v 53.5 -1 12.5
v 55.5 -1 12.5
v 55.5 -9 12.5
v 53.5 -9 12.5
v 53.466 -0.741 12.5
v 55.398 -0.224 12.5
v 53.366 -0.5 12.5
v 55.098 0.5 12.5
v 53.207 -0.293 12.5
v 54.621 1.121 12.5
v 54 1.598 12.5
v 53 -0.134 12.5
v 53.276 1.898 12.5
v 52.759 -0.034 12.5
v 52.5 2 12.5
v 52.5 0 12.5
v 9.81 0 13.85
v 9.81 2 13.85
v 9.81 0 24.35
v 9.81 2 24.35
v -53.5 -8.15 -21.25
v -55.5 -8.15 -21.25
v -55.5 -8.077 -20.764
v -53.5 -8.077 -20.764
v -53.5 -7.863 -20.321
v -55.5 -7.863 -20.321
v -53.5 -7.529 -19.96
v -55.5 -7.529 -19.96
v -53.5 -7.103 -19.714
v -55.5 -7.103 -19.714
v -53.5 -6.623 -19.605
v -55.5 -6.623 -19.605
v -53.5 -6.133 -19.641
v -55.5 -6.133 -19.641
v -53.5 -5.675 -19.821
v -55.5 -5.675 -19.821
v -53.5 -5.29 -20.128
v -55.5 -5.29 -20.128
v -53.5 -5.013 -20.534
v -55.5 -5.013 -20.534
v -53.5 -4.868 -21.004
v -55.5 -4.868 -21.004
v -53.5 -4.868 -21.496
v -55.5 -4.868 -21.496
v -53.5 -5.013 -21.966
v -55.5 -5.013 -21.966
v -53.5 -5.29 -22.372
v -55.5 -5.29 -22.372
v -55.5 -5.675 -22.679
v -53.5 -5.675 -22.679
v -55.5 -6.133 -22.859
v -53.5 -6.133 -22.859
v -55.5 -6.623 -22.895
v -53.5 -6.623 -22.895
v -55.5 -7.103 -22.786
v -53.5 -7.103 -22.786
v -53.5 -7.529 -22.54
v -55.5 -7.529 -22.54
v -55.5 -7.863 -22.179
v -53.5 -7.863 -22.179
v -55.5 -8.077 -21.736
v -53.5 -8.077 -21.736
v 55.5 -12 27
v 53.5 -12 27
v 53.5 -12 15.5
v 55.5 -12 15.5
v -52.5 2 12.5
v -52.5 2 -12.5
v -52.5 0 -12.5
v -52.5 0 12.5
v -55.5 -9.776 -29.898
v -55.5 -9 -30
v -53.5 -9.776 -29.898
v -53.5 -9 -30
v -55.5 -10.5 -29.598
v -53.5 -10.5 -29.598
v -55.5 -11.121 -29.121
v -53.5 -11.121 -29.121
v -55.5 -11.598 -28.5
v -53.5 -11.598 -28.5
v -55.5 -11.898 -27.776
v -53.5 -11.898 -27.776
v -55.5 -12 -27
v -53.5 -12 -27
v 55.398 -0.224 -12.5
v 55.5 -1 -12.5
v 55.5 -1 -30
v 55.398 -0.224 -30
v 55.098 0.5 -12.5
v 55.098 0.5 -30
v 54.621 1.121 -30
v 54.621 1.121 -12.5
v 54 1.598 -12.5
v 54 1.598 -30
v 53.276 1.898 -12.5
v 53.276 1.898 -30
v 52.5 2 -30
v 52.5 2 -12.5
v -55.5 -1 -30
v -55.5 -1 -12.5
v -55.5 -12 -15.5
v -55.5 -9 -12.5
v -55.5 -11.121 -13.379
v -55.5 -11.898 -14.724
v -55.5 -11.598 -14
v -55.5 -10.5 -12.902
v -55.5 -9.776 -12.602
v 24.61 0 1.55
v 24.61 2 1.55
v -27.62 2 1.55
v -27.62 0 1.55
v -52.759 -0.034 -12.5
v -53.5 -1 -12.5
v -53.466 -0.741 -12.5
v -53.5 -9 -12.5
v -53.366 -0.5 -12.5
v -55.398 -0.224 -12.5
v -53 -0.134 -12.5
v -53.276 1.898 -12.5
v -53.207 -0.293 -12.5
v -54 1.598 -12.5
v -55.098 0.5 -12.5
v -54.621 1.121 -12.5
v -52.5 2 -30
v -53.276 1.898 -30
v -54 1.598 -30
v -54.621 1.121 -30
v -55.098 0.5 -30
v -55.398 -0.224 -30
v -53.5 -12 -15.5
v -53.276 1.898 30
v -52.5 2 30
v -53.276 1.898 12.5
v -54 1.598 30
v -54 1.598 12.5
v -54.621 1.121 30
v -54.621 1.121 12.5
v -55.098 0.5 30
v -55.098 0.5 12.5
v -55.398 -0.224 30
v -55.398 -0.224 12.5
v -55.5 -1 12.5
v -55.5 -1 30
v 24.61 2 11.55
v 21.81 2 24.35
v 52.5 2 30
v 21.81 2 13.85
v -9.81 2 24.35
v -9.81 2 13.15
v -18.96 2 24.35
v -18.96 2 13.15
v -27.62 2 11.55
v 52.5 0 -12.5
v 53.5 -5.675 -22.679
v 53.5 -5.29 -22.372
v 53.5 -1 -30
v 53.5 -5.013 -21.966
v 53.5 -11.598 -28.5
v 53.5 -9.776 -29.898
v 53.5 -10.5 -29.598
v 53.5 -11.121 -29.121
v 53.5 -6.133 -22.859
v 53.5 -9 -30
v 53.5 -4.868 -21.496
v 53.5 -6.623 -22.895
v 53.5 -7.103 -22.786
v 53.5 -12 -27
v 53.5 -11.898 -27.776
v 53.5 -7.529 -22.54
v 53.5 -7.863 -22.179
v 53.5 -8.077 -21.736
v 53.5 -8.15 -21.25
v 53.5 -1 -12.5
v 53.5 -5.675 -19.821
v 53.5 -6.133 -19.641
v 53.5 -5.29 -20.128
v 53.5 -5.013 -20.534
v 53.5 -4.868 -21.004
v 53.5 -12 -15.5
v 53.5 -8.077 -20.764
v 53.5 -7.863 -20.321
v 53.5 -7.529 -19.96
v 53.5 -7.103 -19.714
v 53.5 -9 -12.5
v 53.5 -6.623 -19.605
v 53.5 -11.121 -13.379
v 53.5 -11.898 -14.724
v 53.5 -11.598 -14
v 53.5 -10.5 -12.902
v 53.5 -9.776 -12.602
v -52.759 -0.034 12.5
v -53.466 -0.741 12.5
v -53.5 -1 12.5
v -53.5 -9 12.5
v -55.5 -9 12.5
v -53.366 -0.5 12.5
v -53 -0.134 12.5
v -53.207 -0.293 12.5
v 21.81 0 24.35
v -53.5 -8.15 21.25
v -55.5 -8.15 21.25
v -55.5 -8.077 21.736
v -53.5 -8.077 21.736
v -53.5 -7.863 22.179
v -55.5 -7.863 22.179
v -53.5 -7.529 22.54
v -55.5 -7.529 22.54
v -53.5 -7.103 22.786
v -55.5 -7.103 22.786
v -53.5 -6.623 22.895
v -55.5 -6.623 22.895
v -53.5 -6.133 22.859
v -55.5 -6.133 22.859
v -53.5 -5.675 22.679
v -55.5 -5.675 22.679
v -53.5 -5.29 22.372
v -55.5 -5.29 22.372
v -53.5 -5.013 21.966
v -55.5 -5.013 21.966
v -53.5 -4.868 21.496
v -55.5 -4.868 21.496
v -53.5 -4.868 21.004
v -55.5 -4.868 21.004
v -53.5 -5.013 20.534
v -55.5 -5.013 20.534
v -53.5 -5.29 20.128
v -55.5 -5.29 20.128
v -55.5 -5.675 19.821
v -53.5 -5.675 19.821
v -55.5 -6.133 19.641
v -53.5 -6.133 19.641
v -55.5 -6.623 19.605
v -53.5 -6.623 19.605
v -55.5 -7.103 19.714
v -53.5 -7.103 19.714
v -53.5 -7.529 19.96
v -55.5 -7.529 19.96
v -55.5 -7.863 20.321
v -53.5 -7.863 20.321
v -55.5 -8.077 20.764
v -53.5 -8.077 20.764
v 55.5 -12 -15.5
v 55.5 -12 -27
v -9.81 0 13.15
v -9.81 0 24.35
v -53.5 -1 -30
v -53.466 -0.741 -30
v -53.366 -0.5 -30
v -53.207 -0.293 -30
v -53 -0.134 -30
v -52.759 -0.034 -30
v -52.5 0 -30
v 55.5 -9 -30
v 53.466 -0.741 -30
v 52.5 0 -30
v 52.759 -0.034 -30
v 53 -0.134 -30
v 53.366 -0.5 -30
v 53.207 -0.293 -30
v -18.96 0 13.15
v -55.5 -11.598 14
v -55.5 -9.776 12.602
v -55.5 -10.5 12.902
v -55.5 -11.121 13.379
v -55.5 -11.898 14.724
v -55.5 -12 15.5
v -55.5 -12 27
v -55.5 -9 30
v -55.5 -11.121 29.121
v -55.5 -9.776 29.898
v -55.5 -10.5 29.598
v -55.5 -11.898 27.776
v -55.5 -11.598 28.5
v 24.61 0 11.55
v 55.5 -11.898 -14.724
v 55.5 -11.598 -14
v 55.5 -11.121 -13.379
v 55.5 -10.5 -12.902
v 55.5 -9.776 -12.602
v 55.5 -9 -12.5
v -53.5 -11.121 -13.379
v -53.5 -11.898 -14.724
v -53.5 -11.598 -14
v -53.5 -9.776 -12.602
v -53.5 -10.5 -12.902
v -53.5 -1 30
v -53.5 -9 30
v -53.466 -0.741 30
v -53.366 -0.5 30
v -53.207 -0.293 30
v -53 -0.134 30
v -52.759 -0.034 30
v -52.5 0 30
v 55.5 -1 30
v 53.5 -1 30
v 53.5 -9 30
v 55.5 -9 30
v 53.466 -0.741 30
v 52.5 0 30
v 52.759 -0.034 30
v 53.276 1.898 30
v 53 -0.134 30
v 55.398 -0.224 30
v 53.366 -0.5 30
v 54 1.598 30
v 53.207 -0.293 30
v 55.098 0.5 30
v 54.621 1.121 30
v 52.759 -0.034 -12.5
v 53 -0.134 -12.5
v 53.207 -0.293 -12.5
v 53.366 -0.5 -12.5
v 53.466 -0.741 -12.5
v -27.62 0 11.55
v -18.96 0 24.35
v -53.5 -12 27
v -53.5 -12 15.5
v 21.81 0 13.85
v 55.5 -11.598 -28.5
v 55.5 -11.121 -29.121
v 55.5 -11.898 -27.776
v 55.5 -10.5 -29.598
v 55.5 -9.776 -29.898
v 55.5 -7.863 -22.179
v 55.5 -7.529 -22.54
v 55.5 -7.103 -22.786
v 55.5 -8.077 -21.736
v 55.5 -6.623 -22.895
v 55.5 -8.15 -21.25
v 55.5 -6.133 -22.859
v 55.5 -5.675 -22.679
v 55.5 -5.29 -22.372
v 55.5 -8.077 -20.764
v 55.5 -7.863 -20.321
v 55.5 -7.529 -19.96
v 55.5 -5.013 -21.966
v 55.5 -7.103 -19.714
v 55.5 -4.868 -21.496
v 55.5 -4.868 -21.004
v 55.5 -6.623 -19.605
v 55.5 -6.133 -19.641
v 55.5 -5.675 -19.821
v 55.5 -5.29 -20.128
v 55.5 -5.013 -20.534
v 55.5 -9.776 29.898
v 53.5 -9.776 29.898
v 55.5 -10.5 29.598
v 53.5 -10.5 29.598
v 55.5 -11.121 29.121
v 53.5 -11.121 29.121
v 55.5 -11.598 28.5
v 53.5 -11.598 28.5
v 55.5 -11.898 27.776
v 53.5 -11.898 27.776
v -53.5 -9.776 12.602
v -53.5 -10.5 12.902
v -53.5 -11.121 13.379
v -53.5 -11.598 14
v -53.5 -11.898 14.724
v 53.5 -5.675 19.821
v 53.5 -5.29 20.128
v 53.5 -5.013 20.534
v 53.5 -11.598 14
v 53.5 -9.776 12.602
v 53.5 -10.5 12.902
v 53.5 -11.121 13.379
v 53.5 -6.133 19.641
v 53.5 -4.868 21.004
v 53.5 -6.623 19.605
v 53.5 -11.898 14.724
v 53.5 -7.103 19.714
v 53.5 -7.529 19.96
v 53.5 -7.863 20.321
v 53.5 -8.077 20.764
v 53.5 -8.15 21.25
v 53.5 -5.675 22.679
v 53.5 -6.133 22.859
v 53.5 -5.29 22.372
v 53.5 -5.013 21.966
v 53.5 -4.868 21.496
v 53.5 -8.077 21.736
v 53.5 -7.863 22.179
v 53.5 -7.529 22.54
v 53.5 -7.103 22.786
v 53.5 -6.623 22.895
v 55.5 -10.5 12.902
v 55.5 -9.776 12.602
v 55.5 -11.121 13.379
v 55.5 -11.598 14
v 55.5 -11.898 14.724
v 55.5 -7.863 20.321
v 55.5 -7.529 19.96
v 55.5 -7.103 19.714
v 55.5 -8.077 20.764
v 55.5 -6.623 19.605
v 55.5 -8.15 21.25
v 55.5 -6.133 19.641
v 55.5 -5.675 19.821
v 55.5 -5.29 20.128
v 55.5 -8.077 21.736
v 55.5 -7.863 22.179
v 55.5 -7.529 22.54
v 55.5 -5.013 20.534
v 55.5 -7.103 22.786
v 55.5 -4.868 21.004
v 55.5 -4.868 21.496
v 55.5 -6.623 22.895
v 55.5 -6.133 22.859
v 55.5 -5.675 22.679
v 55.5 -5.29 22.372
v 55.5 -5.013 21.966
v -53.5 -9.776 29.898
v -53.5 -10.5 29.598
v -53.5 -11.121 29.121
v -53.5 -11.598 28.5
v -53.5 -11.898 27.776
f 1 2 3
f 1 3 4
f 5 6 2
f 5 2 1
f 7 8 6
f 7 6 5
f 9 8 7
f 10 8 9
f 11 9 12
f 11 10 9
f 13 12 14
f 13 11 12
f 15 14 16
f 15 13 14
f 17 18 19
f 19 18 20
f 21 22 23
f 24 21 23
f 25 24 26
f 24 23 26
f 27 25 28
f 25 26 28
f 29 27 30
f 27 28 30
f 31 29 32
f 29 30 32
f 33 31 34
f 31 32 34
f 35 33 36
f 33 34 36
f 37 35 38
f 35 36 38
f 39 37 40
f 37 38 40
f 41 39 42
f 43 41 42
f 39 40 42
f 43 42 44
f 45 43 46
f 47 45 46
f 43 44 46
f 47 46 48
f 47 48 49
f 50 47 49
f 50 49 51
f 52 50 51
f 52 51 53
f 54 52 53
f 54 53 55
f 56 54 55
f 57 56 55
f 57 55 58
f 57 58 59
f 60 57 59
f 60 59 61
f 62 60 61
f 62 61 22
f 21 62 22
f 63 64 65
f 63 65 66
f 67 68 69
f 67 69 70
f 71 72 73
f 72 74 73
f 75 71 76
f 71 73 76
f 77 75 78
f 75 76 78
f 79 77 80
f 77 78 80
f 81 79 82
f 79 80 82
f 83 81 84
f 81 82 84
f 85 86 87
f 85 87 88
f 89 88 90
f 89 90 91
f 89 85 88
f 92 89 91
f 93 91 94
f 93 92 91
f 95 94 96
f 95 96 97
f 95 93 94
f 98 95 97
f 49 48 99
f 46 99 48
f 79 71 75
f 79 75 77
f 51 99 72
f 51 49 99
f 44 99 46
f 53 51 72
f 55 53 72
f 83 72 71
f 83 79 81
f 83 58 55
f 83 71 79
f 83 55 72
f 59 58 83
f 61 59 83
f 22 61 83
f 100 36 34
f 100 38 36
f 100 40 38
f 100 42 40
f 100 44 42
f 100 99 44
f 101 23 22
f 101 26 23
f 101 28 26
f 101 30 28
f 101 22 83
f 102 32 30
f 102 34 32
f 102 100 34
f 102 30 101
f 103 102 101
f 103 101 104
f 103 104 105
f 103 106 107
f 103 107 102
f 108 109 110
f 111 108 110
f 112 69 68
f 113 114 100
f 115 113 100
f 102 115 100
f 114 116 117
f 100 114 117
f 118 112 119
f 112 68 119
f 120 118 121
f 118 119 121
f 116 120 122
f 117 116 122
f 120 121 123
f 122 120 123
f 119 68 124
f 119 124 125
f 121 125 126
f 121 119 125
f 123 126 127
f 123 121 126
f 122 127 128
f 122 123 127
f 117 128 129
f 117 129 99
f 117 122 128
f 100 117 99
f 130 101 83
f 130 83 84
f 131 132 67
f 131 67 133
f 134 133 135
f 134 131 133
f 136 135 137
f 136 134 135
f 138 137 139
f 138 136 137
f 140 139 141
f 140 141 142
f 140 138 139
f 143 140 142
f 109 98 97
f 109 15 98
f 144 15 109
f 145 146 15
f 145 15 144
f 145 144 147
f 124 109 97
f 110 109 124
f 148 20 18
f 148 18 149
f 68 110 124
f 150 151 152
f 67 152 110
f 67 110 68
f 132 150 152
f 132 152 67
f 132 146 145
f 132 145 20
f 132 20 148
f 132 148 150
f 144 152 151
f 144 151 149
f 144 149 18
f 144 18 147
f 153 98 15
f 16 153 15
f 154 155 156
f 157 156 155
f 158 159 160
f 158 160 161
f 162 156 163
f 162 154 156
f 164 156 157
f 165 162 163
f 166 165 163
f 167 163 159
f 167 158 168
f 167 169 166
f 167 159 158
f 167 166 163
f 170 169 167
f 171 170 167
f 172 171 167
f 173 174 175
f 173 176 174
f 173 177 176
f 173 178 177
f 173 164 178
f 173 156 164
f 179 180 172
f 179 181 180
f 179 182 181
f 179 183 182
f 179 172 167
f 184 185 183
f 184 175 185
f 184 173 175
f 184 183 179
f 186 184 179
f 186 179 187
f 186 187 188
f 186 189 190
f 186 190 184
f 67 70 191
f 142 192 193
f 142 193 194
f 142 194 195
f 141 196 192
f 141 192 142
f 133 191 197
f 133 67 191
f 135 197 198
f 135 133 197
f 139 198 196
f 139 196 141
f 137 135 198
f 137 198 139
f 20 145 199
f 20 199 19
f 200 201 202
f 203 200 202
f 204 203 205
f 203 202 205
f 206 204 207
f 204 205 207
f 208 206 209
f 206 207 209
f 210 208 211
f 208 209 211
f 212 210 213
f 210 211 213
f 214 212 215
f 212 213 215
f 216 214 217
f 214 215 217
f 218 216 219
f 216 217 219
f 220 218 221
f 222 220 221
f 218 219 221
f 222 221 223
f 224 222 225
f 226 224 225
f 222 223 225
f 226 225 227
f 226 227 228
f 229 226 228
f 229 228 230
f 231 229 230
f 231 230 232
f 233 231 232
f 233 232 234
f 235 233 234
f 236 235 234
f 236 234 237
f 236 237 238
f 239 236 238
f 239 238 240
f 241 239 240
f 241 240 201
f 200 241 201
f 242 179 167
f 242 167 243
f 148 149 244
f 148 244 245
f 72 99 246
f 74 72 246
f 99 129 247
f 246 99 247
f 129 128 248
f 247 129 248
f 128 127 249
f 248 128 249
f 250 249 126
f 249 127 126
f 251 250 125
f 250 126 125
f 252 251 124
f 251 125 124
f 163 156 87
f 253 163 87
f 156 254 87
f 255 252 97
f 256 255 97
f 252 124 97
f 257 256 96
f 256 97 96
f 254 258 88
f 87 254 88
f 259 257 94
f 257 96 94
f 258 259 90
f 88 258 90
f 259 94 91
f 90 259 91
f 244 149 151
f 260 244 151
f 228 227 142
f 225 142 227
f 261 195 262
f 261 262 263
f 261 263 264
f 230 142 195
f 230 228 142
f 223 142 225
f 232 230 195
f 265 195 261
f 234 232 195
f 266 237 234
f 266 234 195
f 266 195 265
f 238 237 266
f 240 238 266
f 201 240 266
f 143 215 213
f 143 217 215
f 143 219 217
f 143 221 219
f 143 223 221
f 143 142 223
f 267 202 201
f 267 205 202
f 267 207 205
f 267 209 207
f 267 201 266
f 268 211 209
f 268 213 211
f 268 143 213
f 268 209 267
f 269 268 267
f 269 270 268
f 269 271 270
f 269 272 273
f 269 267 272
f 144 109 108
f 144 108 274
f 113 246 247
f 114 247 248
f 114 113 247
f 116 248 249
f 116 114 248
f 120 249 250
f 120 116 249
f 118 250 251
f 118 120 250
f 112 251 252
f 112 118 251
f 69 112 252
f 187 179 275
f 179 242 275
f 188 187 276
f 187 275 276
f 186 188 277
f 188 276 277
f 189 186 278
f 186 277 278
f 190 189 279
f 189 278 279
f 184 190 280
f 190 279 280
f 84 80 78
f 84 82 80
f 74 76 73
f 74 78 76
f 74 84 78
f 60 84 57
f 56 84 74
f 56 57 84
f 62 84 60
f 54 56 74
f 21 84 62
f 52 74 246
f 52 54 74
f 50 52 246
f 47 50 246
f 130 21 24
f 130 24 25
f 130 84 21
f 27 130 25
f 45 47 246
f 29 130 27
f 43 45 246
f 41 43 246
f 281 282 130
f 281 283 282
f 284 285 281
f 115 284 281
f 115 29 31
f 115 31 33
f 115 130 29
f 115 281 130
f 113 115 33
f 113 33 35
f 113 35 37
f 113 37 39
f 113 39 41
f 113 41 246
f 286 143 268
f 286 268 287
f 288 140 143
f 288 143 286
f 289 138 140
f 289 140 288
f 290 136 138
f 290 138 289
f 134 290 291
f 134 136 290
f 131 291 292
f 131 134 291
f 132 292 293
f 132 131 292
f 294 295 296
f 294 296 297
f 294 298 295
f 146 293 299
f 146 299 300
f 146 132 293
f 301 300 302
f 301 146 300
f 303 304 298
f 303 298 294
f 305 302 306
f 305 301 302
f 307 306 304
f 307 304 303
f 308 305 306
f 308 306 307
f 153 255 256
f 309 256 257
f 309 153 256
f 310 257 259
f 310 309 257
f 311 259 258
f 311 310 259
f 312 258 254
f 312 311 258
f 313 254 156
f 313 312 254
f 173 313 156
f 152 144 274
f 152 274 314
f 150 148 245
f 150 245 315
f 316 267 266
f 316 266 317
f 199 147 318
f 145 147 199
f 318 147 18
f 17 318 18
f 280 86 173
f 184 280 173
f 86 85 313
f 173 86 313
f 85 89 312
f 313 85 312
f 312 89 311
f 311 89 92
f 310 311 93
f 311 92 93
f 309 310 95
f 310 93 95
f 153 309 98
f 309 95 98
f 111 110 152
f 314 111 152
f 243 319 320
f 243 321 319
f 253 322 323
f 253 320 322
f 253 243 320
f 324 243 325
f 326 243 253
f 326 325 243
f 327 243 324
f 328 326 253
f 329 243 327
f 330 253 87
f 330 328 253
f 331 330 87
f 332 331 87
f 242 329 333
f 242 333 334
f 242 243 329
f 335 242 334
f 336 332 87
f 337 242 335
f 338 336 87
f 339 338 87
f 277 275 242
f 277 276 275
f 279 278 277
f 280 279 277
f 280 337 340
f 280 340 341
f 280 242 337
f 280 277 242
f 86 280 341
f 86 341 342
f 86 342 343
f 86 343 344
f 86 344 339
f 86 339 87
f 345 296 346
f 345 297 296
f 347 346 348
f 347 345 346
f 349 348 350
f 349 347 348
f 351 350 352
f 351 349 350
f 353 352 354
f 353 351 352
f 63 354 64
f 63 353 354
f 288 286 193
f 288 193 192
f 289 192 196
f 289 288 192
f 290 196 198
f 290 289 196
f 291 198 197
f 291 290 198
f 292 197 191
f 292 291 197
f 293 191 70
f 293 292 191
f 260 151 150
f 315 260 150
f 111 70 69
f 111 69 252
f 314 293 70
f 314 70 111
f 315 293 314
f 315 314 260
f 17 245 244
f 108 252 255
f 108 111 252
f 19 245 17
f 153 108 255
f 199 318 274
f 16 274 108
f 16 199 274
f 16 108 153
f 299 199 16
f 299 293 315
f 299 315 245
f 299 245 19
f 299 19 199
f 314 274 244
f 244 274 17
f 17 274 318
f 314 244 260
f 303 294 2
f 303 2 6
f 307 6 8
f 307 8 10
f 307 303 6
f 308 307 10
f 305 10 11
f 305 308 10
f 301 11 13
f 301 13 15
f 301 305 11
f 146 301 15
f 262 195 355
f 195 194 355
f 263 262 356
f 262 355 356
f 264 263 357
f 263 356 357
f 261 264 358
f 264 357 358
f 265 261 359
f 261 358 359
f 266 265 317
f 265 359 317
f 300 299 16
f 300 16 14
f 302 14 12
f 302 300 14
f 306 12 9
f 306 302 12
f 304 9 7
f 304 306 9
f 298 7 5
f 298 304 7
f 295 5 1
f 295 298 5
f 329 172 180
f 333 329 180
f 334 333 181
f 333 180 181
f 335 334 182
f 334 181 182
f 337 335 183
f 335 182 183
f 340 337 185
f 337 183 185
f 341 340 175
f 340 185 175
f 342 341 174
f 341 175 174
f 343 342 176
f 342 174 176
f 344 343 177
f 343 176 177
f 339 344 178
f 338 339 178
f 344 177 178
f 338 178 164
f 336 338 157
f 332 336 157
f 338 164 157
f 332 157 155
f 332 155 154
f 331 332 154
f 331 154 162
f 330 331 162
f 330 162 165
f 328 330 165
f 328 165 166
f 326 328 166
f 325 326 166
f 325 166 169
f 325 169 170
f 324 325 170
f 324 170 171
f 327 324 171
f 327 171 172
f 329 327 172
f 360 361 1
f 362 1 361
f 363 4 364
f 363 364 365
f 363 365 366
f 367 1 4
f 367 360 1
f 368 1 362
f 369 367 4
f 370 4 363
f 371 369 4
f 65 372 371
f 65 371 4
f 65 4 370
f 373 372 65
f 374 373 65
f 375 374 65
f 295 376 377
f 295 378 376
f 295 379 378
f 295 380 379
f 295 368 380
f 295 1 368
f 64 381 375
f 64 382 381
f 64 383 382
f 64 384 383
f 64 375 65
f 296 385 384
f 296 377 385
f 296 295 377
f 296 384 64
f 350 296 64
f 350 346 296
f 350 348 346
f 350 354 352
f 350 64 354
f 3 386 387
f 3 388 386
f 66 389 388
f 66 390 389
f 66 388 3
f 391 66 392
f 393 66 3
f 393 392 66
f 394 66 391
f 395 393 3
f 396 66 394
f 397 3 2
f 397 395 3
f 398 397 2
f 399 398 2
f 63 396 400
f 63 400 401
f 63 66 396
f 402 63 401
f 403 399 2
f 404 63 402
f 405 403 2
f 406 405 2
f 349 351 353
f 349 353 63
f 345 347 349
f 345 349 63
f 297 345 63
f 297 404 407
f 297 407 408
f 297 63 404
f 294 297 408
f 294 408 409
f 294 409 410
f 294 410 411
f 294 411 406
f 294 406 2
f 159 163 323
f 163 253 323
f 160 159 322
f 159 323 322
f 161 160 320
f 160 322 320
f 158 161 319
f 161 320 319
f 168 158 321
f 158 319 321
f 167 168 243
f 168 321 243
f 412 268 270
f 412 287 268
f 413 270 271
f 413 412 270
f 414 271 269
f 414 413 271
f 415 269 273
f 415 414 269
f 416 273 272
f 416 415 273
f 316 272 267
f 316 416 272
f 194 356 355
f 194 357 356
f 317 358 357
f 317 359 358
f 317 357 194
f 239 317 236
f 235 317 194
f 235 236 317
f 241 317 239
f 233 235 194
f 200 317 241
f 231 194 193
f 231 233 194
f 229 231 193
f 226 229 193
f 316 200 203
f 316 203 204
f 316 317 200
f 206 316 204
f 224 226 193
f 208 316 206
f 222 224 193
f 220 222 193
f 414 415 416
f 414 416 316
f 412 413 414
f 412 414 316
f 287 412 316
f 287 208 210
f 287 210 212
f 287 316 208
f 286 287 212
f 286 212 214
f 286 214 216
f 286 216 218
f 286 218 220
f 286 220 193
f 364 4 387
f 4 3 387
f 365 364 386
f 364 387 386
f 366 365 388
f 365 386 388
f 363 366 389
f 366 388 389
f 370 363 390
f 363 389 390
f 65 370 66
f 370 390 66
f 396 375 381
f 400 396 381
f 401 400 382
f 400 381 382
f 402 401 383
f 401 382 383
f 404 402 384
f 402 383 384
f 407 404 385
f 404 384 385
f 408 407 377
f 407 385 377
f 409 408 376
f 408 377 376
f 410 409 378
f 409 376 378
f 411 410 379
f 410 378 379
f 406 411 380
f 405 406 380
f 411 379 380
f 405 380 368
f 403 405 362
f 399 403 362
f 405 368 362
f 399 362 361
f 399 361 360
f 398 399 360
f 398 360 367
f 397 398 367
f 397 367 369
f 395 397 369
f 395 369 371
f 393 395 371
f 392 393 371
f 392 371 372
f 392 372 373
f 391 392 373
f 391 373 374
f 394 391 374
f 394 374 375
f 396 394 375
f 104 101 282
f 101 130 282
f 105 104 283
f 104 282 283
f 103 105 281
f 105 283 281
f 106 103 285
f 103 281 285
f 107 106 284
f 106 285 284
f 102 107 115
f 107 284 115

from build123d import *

# Parameters (mm, degrees)
F1_DEPTH = 30
F2_W     = 3
F2_H     = 25
F2_W_2   = 12
F2_H_2   = 10.5
F2_W_3   = 9.15
F2_H_3   = 11.2
F2_W_4   = 52.23
F2_H_4   = 10
F3_DEPTH = 14.001
F5_D     = 3.3
F6_R     = 3


with BuildPart() as f1:
    # F0 (on Top) → F1 (new body, symmetric)
    with BuildSketch(Plane.XY):
        with BuildLine():
            Line((-52.5, 0), (52.5, 0))
            ThreePointArc((52.5, 0), (53.2071067812, -0.2928932188), (53.5, -1))
            Line((53.5, -1), (53.5, -12))
            Line((53.5, -12), (55.5, -12))
            Line((55.5, -12), (55.5, -1))
            ThreePointArc((55.5, -1), (54.6213203436, 1.1213203436), (52.5, 2))
            Line((52.5, 2), (-52.5, 2))
            ThreePointArc((-52.5, 2), (-54.6213203436, 1.1213203436), (-55.5, -1))
            Line((-55.5, -1), (-55.5, -12))
            Line((-55.5, -12), (-53.5, -12))
            Line((-53.5, -12), (-53.5, -1))
            ThreePointArc((-53.5, -1), (-53.2071067812, -0.2928932188), (-52.5, 0))
        make_face()
    extrude(amount=F1_DEPTH, both=True)

    # F2 (on face) → F3 (cut, through all)
    with BuildSketch(Plane(origin=(0, 2, 0), x_dir=(-1, 0, 0), z_dir=(0, 1, 0))):
        with Locations((-54, 0)):
            Rectangle(F2_W, F2_H)
        with Locations((54, 0)):
            Rectangle(F2_W, F2_H)
        with Locations((-15.81, 19.1)):
            Rectangle(F2_W_2, F2_H_2)
        with Locations((14.385, 18.75)):
            Rectangle(F2_W_3, F2_H_3)
        with Locations((1.505, 6.55)):
            Rectangle(F2_W_4, F2_H_4)
    extrude(amount=-F3_DEPTH, mode=Mode.SUBTRACT)

    # F5 (through all)
    with Locations(Plane.YZ.offset(55.5)):
        with Locations((-6.5, 21.25), (-6.5, -21.25)):
            Hole(F5_D / 2)

    # F6
    f6_edges = [f1.edges().sort_by_distance(p)[0] for p in [
        (-54.5, -12, 30),
        (-54.5, -12, 12.5),
        (-54.5, -12, -12.5),
        (-54.5, -12, -30),
        (54.5, -12, 30),
        (54.5, -12, 12.5),
        (54.5, -12, -12.5),
        (54.5, -12, -30),
    ]]
    fillet(f6_edges, radius=F6_R)


solid = f1.part
